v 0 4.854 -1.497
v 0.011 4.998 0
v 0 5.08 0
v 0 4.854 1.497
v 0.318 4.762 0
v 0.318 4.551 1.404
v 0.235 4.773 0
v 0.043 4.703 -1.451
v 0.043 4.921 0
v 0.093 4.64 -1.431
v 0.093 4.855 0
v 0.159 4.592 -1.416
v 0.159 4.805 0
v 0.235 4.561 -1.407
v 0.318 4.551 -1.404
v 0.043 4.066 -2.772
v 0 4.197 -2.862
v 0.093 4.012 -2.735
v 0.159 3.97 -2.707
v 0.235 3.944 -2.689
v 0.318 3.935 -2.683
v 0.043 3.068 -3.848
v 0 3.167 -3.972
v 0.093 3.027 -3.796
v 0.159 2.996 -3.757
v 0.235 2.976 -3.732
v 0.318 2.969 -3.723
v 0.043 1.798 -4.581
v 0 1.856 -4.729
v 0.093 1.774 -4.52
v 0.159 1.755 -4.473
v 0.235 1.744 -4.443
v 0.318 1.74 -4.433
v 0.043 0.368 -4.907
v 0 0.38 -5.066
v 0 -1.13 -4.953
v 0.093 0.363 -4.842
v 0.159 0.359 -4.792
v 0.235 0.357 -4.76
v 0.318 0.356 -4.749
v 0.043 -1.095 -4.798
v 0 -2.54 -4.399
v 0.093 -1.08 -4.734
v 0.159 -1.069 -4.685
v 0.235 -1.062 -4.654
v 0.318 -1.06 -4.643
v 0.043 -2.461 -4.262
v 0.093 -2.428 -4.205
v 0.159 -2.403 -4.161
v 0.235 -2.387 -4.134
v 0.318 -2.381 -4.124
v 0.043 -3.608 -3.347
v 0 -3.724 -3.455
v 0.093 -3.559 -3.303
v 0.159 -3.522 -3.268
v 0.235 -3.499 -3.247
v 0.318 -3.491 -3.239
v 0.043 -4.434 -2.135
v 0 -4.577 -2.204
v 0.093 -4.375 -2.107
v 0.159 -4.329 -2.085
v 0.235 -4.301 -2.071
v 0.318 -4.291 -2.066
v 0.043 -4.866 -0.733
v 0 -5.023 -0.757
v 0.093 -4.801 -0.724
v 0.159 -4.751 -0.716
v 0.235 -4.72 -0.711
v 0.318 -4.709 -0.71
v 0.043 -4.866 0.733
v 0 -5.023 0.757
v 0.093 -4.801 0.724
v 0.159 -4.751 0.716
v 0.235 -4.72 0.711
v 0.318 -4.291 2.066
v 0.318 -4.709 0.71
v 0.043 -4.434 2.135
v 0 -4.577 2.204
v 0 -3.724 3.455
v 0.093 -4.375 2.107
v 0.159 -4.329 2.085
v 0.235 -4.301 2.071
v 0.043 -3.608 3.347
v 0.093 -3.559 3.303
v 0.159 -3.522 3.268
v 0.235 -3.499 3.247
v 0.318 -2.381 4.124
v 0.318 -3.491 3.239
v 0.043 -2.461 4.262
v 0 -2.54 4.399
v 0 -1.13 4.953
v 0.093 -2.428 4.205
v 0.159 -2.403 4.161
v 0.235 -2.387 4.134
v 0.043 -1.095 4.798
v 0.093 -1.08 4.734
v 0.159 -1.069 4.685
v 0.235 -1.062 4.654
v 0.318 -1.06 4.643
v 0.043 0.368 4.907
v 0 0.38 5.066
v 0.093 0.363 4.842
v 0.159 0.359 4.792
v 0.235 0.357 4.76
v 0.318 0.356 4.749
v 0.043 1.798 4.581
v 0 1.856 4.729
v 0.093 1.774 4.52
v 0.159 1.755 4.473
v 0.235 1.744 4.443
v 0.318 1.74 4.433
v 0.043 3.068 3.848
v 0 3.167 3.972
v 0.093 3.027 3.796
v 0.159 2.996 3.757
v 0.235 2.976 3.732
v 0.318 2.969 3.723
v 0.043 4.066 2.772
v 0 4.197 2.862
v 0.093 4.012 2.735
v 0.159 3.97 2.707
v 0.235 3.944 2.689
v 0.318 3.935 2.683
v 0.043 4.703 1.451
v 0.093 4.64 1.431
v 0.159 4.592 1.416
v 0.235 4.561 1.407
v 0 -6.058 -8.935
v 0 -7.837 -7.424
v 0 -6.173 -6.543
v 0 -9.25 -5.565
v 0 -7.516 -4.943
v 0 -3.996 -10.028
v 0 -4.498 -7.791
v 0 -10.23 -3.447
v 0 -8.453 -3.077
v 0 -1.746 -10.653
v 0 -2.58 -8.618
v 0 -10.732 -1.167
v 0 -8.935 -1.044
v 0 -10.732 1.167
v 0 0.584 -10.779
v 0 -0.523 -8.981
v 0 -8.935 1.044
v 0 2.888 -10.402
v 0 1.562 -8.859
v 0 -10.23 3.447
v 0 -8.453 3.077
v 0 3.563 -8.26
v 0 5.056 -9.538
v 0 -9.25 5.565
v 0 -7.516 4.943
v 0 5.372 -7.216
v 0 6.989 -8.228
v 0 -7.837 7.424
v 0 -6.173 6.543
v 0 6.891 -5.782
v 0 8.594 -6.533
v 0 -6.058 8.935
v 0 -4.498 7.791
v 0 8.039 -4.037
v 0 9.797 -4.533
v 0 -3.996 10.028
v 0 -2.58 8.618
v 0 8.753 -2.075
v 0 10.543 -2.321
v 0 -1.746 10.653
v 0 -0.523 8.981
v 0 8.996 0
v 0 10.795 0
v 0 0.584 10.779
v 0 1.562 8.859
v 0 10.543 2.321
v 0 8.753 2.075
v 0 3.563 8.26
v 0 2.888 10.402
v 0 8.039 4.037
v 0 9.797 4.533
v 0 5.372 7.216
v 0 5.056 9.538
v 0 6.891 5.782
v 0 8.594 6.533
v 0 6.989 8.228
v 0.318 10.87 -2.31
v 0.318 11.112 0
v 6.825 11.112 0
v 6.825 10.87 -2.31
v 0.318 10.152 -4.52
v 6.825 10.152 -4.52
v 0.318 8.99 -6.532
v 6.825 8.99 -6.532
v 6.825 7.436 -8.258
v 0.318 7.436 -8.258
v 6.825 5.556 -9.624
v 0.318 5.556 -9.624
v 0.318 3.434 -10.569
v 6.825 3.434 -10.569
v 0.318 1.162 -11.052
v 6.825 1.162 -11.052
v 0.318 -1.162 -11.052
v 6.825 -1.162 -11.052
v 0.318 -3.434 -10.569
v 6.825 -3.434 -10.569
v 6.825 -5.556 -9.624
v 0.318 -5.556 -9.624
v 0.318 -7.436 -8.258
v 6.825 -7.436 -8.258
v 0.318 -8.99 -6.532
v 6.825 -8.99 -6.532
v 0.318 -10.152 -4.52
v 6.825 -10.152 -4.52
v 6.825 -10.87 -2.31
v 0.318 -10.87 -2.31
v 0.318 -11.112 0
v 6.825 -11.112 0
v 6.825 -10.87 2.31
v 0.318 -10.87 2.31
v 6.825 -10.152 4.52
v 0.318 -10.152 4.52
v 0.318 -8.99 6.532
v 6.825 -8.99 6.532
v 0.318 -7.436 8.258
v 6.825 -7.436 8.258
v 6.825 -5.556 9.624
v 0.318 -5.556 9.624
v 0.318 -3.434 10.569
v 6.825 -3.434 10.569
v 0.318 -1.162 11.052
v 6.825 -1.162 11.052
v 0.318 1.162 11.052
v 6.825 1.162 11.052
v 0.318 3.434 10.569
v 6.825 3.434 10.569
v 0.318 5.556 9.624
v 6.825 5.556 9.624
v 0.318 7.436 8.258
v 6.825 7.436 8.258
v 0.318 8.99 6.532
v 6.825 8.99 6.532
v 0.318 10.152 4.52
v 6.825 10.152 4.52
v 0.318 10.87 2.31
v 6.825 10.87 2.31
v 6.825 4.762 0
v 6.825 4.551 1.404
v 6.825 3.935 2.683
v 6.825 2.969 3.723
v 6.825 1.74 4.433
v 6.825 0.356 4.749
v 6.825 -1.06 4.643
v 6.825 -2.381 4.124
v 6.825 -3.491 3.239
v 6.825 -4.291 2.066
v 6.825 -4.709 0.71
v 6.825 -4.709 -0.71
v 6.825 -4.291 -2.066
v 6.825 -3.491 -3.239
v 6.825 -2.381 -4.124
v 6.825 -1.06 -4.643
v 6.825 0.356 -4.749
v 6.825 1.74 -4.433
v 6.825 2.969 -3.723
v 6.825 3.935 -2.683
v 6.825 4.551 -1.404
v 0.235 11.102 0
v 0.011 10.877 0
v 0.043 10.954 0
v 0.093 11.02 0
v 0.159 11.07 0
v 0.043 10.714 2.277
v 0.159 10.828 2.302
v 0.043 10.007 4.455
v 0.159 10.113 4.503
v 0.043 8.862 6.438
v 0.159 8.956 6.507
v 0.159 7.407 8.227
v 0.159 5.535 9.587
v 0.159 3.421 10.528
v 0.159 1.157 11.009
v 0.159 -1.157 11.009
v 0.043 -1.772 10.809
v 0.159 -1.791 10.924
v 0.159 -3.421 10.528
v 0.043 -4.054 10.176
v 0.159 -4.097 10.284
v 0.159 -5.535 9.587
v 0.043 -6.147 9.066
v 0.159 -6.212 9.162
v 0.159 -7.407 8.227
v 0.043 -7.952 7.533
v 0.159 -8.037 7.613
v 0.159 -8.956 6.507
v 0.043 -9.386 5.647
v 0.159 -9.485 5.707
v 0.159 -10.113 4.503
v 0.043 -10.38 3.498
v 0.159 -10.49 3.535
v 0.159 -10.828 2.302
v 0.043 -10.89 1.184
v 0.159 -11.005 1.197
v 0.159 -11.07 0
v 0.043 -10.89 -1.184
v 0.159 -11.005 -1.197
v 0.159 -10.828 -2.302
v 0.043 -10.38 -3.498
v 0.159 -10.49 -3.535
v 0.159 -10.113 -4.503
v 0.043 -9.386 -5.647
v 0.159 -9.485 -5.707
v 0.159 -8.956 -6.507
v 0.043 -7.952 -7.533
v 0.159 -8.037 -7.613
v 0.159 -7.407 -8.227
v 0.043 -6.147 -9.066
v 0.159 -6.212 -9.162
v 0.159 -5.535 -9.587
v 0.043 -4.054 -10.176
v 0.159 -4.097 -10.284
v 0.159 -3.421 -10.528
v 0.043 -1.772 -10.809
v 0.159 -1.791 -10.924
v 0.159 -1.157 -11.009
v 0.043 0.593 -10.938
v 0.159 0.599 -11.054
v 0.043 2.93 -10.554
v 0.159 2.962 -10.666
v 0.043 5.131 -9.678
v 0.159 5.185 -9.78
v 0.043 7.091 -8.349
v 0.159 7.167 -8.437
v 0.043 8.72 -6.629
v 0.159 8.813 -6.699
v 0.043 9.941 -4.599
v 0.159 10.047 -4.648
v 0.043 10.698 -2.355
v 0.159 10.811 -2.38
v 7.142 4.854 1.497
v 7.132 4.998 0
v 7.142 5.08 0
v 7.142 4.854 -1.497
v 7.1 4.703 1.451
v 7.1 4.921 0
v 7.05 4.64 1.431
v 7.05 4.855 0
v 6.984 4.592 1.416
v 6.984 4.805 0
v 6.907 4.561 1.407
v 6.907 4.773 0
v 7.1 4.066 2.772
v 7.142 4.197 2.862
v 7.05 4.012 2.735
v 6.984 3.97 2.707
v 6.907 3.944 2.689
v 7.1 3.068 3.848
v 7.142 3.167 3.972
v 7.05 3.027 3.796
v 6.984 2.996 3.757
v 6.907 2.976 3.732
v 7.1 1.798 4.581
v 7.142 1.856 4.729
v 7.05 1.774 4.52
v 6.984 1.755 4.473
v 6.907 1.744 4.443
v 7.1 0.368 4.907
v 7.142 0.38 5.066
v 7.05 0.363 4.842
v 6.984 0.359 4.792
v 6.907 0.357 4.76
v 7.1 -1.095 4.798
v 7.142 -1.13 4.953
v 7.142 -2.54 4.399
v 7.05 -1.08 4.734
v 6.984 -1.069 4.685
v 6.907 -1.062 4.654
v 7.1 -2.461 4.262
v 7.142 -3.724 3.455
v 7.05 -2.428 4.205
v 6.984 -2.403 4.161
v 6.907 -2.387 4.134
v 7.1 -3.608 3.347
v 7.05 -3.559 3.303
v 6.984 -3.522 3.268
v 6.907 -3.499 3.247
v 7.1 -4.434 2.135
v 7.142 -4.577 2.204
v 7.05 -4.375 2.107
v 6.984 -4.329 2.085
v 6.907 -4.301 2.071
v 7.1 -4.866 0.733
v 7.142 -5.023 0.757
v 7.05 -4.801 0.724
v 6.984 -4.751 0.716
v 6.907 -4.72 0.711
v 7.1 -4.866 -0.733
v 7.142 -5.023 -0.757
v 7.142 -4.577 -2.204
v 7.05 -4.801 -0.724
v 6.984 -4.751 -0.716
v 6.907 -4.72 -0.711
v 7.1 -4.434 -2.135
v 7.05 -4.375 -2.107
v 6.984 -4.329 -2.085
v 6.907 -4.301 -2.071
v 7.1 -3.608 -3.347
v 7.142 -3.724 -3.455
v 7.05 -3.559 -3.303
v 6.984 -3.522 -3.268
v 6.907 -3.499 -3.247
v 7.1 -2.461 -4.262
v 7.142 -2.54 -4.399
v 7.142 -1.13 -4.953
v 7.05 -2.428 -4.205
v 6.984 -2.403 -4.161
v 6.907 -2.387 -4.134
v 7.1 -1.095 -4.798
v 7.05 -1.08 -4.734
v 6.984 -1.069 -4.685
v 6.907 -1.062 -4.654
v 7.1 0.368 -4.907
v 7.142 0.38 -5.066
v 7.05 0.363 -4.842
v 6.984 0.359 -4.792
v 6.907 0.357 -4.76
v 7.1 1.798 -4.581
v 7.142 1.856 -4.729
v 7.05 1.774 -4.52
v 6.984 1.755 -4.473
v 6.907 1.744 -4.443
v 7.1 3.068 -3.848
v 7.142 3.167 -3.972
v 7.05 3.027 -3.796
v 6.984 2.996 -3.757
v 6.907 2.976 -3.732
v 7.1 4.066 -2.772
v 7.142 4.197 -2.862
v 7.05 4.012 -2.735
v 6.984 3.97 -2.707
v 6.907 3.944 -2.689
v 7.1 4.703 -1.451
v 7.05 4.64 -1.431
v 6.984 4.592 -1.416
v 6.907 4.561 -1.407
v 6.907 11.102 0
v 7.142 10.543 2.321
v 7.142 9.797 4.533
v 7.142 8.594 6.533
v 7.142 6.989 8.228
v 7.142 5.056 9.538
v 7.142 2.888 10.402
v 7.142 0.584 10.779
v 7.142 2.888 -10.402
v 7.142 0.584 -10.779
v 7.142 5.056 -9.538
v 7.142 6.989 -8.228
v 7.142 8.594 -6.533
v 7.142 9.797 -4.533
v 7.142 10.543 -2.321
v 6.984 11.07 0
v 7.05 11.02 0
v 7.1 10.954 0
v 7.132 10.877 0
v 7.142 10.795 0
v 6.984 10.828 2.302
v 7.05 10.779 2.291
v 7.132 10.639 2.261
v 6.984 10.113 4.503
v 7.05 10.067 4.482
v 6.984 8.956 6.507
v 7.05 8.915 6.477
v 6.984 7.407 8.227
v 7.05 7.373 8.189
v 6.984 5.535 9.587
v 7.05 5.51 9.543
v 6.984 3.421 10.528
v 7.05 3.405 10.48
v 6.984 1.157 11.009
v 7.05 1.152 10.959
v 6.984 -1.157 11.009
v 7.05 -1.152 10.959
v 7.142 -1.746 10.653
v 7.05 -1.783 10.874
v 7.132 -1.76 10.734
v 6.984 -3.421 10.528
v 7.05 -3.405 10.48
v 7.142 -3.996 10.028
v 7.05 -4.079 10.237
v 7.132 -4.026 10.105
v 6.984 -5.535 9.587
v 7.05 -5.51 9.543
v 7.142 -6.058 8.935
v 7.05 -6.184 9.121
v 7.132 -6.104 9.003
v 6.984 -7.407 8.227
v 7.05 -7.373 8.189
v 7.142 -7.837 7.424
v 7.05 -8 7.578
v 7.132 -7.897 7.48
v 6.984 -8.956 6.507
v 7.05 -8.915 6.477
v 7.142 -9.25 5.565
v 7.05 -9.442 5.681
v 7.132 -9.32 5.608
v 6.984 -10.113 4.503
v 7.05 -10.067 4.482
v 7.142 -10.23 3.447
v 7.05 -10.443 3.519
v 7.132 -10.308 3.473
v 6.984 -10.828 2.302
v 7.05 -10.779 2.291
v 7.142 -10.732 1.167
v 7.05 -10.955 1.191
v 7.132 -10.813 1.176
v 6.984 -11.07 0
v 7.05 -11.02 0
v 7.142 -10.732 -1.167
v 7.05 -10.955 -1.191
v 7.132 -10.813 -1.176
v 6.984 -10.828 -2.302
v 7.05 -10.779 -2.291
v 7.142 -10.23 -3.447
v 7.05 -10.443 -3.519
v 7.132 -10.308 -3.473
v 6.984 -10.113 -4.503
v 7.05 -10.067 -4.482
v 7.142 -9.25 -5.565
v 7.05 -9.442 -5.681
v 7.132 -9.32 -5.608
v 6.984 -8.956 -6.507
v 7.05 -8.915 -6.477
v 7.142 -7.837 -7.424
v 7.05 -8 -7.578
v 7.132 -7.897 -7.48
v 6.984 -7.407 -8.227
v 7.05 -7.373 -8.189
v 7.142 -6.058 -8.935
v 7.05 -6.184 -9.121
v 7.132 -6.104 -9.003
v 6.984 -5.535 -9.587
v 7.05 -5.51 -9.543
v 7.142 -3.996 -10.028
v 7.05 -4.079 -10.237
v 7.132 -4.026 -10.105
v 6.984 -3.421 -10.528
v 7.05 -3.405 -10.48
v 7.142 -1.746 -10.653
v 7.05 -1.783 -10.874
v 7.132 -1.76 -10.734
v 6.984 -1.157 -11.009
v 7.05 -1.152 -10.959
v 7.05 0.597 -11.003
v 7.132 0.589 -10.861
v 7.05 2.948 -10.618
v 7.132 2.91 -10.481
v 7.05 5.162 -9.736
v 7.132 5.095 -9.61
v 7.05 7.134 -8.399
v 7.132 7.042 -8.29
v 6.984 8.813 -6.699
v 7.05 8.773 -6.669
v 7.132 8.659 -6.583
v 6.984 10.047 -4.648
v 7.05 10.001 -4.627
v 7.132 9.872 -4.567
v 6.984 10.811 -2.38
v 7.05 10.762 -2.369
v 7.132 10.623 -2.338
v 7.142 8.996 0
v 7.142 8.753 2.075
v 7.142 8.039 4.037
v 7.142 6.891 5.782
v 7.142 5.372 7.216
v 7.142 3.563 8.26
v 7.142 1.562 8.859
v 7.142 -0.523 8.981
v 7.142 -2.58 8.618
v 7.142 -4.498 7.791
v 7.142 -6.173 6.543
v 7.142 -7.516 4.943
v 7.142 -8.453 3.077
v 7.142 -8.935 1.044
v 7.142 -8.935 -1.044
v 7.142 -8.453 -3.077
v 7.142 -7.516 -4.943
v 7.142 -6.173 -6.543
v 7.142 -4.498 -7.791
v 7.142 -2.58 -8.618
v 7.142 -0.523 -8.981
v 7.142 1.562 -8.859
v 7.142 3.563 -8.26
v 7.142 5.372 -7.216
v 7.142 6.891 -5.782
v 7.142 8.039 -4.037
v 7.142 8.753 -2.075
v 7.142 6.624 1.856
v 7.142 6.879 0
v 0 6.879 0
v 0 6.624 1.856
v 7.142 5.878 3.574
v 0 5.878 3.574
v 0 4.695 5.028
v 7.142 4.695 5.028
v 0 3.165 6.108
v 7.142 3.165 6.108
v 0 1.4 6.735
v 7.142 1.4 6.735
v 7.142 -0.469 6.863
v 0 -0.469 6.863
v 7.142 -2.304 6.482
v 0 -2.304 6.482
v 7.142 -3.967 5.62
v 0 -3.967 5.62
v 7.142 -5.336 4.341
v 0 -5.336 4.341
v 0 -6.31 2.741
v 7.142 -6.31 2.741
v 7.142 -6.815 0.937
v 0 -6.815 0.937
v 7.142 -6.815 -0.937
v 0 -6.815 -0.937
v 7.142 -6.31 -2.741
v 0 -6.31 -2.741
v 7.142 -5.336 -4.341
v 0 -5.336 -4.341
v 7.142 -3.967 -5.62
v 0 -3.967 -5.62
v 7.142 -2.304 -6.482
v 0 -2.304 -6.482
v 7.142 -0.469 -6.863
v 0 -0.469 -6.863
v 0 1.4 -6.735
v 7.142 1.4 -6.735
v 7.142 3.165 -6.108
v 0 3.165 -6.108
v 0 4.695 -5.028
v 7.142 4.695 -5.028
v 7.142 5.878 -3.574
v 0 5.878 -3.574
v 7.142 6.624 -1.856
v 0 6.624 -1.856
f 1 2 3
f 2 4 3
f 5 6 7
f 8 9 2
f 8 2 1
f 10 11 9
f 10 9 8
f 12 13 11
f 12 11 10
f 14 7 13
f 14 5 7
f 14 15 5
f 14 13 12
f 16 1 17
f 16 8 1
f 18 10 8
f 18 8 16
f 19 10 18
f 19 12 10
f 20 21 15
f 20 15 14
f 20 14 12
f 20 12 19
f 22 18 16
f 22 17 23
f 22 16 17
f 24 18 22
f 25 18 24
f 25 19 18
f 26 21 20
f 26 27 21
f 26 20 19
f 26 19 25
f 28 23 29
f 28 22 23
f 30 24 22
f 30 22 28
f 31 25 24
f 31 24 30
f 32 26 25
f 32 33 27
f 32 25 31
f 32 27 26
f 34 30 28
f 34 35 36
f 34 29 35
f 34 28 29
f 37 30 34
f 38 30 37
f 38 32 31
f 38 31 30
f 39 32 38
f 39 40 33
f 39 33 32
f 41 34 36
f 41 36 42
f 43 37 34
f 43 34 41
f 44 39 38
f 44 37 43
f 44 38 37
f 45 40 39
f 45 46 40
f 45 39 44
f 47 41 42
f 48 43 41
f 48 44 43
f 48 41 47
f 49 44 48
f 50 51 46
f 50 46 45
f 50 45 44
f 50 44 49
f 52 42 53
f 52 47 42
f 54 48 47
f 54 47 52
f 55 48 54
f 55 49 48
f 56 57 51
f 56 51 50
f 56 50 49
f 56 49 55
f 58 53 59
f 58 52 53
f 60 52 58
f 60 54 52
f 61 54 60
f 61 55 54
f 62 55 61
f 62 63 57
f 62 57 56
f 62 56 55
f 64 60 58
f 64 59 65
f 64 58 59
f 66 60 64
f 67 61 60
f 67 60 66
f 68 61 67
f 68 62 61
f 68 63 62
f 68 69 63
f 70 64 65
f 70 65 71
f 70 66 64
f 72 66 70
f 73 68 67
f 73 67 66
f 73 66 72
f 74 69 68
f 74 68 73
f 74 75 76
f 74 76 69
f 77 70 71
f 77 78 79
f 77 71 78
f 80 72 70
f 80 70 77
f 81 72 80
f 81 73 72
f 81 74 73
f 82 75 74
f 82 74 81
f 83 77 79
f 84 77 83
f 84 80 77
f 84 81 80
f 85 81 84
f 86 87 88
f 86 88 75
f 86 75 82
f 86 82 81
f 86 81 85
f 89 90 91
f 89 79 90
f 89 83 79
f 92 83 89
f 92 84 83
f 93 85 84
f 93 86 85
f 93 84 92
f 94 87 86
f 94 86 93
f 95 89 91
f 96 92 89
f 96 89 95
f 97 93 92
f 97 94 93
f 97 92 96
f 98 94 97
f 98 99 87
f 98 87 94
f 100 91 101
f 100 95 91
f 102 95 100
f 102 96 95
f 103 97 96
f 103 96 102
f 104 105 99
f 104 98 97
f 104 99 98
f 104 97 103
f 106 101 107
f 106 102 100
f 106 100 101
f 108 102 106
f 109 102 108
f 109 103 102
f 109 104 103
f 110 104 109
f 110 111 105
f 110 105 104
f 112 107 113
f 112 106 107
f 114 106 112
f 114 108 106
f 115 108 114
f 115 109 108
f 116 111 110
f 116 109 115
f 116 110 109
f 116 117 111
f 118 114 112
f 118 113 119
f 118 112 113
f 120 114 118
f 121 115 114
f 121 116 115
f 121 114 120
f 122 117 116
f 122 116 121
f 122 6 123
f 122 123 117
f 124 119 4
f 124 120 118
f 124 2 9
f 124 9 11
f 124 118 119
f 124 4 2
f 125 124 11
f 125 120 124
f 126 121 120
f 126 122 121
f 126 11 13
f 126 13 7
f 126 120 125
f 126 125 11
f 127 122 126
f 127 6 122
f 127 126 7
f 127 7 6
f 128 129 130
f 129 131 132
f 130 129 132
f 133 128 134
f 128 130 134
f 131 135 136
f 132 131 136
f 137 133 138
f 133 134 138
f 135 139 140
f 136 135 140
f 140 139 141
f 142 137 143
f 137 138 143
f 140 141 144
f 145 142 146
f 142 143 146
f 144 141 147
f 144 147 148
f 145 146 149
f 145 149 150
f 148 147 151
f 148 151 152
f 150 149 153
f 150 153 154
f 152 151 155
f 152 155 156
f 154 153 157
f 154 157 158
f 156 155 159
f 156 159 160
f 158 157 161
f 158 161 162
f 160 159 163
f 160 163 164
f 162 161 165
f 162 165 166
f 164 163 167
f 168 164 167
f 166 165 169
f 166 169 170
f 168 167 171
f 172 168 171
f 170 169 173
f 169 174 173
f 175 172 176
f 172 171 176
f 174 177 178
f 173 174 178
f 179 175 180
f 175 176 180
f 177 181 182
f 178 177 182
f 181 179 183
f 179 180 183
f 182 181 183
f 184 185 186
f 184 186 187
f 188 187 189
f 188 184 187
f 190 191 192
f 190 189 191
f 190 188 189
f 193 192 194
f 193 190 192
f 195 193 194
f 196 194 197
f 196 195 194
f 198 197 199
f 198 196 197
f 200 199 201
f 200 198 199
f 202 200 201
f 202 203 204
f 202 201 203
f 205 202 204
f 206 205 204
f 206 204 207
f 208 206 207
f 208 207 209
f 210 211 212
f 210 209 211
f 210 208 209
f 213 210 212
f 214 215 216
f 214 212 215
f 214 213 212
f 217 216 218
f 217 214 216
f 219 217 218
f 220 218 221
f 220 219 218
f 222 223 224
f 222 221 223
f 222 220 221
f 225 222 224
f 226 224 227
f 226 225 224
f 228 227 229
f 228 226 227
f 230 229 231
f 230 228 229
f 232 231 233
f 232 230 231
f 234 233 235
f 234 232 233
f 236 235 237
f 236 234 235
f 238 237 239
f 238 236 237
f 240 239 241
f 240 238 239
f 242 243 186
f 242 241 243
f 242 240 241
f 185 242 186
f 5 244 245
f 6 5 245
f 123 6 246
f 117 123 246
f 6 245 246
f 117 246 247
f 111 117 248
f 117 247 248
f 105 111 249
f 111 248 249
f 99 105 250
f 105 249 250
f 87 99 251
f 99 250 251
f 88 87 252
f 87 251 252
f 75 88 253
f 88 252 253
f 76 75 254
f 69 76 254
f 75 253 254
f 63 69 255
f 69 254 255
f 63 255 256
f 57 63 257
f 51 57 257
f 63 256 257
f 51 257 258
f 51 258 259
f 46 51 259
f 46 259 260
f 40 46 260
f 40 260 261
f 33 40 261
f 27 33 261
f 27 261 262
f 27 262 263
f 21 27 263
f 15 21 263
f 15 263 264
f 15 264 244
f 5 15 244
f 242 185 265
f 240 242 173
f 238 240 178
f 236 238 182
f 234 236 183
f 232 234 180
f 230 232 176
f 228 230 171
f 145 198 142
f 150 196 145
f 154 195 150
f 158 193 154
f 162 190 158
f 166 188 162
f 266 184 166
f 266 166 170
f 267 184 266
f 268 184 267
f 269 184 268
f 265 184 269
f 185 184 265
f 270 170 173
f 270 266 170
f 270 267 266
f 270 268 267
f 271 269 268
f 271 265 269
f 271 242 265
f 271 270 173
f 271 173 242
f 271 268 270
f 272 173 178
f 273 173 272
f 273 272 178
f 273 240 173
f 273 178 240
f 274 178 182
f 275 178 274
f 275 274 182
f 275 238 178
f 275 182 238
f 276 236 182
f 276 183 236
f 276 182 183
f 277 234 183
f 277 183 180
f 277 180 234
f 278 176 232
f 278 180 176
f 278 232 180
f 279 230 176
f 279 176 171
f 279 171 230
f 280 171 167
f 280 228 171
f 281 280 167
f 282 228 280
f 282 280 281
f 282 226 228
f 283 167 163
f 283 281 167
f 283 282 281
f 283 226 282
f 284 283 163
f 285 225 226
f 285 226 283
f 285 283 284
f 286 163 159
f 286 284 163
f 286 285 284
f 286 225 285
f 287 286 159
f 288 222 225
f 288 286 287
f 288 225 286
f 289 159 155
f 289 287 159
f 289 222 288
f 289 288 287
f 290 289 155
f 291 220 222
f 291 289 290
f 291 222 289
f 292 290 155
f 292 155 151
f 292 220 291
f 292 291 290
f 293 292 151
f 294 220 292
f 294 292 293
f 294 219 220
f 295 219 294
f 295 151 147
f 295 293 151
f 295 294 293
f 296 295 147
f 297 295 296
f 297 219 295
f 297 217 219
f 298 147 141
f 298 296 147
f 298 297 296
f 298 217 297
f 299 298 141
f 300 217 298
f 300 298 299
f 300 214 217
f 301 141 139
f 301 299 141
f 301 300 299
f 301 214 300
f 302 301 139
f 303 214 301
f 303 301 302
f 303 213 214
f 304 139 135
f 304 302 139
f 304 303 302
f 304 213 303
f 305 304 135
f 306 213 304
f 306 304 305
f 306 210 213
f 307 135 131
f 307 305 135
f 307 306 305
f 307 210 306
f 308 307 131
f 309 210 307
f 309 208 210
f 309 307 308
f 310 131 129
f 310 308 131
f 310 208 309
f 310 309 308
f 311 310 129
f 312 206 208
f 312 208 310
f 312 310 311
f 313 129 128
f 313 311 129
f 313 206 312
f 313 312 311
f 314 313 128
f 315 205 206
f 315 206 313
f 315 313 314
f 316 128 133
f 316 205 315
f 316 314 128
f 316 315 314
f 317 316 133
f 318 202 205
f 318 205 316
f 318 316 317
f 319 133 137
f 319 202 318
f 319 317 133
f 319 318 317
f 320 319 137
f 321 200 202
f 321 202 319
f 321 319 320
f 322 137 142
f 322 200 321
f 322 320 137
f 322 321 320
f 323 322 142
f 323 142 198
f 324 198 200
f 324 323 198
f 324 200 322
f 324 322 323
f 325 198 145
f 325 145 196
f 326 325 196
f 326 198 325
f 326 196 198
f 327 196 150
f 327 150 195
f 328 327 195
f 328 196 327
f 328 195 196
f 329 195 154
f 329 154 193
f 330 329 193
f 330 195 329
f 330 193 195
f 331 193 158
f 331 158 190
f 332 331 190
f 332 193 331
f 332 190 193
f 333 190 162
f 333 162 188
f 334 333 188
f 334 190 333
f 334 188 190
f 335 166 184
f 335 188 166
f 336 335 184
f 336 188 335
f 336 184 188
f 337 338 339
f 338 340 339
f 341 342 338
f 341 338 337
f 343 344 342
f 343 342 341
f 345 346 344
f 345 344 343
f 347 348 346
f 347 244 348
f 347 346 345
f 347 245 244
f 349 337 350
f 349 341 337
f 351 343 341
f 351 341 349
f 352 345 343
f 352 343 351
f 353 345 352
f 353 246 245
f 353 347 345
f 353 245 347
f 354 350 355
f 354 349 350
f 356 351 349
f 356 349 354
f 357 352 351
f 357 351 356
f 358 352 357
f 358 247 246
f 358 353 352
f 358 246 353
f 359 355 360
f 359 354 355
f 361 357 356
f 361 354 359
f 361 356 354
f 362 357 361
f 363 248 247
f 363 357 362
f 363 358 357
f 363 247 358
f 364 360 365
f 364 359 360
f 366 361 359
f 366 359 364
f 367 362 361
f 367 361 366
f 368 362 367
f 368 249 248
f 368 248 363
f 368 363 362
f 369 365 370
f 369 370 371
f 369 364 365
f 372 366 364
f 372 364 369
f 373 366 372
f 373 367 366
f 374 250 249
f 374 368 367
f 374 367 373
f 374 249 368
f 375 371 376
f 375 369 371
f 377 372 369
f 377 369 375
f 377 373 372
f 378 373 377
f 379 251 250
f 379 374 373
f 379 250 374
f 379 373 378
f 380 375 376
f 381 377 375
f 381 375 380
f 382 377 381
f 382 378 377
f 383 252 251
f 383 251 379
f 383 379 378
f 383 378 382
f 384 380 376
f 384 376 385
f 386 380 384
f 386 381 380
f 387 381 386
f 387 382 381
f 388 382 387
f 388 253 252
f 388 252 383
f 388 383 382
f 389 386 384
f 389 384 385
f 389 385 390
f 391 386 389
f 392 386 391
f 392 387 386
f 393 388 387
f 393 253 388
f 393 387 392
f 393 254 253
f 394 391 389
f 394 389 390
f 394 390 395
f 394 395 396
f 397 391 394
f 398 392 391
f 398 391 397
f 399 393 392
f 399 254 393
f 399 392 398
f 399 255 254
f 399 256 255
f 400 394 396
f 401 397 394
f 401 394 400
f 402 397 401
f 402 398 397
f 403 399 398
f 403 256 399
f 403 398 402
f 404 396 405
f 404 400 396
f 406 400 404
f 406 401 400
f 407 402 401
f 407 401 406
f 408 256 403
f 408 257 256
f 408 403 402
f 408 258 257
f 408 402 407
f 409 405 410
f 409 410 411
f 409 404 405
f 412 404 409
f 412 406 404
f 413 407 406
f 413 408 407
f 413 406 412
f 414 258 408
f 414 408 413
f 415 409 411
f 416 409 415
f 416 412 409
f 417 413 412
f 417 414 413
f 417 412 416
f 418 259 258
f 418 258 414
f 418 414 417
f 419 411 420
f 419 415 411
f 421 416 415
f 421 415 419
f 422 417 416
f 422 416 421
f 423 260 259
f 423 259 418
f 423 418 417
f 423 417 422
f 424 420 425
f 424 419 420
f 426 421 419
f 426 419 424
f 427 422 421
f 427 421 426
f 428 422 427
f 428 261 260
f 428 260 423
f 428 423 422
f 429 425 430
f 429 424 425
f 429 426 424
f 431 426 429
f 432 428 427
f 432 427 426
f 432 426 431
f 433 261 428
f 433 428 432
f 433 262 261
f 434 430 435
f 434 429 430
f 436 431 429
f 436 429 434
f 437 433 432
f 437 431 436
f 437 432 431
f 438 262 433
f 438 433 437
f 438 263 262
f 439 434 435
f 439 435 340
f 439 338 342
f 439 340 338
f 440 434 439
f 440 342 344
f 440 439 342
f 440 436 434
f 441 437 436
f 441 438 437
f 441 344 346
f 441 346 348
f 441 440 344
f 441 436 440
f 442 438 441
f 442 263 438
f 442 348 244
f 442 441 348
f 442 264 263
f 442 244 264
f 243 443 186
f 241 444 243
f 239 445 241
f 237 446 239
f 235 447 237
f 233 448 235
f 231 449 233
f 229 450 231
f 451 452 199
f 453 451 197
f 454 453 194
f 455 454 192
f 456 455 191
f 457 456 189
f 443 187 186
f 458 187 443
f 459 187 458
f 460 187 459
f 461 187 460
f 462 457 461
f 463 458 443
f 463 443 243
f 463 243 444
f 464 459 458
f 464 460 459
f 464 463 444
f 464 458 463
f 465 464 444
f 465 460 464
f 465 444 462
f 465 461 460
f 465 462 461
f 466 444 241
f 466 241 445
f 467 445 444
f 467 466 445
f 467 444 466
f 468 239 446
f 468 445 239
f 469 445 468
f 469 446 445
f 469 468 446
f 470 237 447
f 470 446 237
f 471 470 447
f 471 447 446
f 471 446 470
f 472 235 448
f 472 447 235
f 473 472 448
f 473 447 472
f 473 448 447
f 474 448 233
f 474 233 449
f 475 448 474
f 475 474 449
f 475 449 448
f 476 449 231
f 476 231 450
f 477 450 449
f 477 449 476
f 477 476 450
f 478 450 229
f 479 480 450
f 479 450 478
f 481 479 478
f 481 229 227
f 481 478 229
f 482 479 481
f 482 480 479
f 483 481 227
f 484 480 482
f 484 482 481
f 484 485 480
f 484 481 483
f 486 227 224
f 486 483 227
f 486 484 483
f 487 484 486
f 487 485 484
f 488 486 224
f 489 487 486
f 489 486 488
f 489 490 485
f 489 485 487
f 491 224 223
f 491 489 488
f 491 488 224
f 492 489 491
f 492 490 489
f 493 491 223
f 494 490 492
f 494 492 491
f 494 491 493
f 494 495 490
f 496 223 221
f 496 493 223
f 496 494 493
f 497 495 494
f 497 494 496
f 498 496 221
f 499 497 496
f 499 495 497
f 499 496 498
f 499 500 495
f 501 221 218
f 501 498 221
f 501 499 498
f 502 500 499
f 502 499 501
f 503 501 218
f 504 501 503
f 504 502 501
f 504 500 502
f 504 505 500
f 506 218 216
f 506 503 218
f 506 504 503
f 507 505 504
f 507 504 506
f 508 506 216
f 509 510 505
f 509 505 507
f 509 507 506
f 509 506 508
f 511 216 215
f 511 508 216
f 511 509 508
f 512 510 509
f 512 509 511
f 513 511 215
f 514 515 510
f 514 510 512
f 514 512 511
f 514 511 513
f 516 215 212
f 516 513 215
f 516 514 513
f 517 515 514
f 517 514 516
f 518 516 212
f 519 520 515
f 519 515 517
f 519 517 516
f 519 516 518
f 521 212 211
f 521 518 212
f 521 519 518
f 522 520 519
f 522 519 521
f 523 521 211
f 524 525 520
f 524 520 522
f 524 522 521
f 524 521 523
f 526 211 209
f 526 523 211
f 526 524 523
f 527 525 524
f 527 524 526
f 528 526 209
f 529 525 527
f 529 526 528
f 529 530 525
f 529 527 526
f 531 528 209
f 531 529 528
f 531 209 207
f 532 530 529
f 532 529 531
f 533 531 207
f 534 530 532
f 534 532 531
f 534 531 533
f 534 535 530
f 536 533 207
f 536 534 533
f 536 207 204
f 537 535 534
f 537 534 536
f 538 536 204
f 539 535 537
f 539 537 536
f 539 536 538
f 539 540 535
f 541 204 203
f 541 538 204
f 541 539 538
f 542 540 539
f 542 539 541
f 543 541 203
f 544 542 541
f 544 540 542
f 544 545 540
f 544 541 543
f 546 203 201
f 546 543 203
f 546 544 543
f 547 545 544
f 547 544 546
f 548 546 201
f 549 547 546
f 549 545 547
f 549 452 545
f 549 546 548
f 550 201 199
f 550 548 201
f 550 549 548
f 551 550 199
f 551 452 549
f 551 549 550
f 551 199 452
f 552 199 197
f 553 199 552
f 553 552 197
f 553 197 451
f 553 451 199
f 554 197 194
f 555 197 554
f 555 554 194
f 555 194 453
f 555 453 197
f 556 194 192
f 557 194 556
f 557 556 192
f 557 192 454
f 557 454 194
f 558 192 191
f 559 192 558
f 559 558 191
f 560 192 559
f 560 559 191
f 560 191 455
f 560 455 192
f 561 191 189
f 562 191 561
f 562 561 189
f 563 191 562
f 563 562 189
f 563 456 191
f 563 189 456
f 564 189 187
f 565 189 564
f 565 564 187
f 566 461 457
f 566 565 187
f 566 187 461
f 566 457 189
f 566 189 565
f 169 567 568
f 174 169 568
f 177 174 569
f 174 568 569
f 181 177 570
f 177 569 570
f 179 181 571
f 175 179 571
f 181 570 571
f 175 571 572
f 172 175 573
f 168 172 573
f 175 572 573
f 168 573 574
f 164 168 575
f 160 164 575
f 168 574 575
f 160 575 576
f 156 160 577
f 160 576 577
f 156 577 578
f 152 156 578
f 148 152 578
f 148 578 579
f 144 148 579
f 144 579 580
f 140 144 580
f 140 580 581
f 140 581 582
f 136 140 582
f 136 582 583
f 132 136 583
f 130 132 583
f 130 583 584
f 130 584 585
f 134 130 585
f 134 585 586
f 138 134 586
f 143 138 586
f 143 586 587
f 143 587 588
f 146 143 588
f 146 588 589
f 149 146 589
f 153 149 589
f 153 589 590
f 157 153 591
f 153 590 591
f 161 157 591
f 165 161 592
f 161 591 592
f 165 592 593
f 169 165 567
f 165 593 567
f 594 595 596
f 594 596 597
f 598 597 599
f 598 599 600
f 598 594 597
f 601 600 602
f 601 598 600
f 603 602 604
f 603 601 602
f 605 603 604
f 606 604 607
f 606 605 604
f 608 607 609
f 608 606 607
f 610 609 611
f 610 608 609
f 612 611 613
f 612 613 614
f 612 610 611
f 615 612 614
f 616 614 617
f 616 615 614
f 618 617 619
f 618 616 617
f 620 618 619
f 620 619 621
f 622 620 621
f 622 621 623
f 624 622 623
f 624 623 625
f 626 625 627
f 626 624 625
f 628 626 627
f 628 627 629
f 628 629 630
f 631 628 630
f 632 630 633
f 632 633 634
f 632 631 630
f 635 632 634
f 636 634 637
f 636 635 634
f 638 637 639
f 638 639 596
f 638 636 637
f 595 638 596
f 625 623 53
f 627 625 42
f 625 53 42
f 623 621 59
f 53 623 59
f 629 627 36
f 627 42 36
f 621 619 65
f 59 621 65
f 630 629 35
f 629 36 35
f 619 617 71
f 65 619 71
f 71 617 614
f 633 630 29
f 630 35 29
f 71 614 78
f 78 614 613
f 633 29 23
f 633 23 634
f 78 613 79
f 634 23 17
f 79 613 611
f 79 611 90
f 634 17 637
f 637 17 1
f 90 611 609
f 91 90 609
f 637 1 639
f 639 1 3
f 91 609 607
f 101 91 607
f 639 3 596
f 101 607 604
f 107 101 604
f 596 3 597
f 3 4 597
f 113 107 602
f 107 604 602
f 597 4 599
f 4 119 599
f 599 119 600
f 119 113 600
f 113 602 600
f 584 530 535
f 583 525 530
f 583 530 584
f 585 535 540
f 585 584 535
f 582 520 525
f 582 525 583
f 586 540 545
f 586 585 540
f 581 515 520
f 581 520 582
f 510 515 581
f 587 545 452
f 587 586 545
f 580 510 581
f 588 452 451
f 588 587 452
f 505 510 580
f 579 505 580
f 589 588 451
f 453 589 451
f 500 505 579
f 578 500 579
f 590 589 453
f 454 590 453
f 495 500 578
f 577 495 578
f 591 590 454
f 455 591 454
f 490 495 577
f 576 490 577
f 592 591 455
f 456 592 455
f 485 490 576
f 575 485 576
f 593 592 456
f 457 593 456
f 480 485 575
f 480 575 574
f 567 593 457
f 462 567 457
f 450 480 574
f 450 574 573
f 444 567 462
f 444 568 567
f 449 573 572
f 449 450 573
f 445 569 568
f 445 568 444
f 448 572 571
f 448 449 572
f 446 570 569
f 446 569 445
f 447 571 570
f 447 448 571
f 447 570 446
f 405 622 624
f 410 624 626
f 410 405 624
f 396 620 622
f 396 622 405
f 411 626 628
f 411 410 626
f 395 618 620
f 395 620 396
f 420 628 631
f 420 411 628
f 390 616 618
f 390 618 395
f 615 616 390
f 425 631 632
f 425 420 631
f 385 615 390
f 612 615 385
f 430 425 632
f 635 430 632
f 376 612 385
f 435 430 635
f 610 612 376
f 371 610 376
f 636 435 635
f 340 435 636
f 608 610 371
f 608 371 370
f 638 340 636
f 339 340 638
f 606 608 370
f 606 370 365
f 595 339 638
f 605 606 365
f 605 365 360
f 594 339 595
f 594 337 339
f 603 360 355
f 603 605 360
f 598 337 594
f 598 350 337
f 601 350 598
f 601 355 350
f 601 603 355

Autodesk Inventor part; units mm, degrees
ref_plane "YZ Plane" through (0, 0, 0) normal (1, 0, 0) x (0, 1, 0)
ref_plane "XZ Plane" through (0, 0, 0) normal (0, 1, 0) x (-1, 0, 0)
ref_plane "XY Plane" through (0, 0, 0) normal (0, 0, 1) x (1, 0, 0)
sketch "Sketch" plane through (0, 0, 0) normal (0, 0, 1) x (1, 0, 0)
  line L0 (0, 0) -> (7.1425, 0)
  line L1 (0, 0) -> (0, 4.7625) construction
  line L2 (0, 4.7625) -> (7.1425, 4.7625)
  line L3 (7.1425, 4.7625) -> (7.1425, 11.1125)
  line L4 (7.1425, 11.1125) -> (0, 11.1125)
  line L5 (0, 11.1125) -> (0, 4.7625)
  line L6 (0, 7.9375) -> (7.1425, 7.9375)
  line L7 (0, 8.9958) -> (7.1425, 8.9958)
  line L8 (0, 6.8792) -> (7.1425, 6.8792)
  dimension "d0" = 7.1425
  dimension "d1" = 9.525
  dimension "d2" = 13.7583
  dimension "d3" = 22.225
revolve "Body" add sketch "Sketch" angle 360 about axis through (0, 0, 0) along (1, 0, 0) contours L5 L8 L3 L2 | L5 L4 L3 L7
fillet "Fillet1" radius 0.3175 4 edges at (0, -11.1125, 0) (7.1425, -11.1125, 0) (0, -4.7625, 0) (7.1425, -4.7625, 0)
equation "\"d5\" = -0.025 * WD + 0.025 * BD"
equation "\"d0\" = KB"
equation "\"d1\" = WD"
equation "\"d2\" = 0.333333 * BD + 0.666667 * WD"
equation "\"d3\" = BD"
equation "\"WD\" = 9.525"
equation "\"BD\" = 22.225"
equation "\"KB\" = 7.14248"
equation "\"BBA\" = 0"
equation "\"KRS\" = 0.4064"
equation "\"KR1S\" = 0.2032"
equation "\"BR\" = 0.5 * BD"
equation "\"WR\" = 0.5 * WD"
properties part number "ISO 1224 - 0.375 x  0.875 x  0.2812" material "Steel, Mild"
